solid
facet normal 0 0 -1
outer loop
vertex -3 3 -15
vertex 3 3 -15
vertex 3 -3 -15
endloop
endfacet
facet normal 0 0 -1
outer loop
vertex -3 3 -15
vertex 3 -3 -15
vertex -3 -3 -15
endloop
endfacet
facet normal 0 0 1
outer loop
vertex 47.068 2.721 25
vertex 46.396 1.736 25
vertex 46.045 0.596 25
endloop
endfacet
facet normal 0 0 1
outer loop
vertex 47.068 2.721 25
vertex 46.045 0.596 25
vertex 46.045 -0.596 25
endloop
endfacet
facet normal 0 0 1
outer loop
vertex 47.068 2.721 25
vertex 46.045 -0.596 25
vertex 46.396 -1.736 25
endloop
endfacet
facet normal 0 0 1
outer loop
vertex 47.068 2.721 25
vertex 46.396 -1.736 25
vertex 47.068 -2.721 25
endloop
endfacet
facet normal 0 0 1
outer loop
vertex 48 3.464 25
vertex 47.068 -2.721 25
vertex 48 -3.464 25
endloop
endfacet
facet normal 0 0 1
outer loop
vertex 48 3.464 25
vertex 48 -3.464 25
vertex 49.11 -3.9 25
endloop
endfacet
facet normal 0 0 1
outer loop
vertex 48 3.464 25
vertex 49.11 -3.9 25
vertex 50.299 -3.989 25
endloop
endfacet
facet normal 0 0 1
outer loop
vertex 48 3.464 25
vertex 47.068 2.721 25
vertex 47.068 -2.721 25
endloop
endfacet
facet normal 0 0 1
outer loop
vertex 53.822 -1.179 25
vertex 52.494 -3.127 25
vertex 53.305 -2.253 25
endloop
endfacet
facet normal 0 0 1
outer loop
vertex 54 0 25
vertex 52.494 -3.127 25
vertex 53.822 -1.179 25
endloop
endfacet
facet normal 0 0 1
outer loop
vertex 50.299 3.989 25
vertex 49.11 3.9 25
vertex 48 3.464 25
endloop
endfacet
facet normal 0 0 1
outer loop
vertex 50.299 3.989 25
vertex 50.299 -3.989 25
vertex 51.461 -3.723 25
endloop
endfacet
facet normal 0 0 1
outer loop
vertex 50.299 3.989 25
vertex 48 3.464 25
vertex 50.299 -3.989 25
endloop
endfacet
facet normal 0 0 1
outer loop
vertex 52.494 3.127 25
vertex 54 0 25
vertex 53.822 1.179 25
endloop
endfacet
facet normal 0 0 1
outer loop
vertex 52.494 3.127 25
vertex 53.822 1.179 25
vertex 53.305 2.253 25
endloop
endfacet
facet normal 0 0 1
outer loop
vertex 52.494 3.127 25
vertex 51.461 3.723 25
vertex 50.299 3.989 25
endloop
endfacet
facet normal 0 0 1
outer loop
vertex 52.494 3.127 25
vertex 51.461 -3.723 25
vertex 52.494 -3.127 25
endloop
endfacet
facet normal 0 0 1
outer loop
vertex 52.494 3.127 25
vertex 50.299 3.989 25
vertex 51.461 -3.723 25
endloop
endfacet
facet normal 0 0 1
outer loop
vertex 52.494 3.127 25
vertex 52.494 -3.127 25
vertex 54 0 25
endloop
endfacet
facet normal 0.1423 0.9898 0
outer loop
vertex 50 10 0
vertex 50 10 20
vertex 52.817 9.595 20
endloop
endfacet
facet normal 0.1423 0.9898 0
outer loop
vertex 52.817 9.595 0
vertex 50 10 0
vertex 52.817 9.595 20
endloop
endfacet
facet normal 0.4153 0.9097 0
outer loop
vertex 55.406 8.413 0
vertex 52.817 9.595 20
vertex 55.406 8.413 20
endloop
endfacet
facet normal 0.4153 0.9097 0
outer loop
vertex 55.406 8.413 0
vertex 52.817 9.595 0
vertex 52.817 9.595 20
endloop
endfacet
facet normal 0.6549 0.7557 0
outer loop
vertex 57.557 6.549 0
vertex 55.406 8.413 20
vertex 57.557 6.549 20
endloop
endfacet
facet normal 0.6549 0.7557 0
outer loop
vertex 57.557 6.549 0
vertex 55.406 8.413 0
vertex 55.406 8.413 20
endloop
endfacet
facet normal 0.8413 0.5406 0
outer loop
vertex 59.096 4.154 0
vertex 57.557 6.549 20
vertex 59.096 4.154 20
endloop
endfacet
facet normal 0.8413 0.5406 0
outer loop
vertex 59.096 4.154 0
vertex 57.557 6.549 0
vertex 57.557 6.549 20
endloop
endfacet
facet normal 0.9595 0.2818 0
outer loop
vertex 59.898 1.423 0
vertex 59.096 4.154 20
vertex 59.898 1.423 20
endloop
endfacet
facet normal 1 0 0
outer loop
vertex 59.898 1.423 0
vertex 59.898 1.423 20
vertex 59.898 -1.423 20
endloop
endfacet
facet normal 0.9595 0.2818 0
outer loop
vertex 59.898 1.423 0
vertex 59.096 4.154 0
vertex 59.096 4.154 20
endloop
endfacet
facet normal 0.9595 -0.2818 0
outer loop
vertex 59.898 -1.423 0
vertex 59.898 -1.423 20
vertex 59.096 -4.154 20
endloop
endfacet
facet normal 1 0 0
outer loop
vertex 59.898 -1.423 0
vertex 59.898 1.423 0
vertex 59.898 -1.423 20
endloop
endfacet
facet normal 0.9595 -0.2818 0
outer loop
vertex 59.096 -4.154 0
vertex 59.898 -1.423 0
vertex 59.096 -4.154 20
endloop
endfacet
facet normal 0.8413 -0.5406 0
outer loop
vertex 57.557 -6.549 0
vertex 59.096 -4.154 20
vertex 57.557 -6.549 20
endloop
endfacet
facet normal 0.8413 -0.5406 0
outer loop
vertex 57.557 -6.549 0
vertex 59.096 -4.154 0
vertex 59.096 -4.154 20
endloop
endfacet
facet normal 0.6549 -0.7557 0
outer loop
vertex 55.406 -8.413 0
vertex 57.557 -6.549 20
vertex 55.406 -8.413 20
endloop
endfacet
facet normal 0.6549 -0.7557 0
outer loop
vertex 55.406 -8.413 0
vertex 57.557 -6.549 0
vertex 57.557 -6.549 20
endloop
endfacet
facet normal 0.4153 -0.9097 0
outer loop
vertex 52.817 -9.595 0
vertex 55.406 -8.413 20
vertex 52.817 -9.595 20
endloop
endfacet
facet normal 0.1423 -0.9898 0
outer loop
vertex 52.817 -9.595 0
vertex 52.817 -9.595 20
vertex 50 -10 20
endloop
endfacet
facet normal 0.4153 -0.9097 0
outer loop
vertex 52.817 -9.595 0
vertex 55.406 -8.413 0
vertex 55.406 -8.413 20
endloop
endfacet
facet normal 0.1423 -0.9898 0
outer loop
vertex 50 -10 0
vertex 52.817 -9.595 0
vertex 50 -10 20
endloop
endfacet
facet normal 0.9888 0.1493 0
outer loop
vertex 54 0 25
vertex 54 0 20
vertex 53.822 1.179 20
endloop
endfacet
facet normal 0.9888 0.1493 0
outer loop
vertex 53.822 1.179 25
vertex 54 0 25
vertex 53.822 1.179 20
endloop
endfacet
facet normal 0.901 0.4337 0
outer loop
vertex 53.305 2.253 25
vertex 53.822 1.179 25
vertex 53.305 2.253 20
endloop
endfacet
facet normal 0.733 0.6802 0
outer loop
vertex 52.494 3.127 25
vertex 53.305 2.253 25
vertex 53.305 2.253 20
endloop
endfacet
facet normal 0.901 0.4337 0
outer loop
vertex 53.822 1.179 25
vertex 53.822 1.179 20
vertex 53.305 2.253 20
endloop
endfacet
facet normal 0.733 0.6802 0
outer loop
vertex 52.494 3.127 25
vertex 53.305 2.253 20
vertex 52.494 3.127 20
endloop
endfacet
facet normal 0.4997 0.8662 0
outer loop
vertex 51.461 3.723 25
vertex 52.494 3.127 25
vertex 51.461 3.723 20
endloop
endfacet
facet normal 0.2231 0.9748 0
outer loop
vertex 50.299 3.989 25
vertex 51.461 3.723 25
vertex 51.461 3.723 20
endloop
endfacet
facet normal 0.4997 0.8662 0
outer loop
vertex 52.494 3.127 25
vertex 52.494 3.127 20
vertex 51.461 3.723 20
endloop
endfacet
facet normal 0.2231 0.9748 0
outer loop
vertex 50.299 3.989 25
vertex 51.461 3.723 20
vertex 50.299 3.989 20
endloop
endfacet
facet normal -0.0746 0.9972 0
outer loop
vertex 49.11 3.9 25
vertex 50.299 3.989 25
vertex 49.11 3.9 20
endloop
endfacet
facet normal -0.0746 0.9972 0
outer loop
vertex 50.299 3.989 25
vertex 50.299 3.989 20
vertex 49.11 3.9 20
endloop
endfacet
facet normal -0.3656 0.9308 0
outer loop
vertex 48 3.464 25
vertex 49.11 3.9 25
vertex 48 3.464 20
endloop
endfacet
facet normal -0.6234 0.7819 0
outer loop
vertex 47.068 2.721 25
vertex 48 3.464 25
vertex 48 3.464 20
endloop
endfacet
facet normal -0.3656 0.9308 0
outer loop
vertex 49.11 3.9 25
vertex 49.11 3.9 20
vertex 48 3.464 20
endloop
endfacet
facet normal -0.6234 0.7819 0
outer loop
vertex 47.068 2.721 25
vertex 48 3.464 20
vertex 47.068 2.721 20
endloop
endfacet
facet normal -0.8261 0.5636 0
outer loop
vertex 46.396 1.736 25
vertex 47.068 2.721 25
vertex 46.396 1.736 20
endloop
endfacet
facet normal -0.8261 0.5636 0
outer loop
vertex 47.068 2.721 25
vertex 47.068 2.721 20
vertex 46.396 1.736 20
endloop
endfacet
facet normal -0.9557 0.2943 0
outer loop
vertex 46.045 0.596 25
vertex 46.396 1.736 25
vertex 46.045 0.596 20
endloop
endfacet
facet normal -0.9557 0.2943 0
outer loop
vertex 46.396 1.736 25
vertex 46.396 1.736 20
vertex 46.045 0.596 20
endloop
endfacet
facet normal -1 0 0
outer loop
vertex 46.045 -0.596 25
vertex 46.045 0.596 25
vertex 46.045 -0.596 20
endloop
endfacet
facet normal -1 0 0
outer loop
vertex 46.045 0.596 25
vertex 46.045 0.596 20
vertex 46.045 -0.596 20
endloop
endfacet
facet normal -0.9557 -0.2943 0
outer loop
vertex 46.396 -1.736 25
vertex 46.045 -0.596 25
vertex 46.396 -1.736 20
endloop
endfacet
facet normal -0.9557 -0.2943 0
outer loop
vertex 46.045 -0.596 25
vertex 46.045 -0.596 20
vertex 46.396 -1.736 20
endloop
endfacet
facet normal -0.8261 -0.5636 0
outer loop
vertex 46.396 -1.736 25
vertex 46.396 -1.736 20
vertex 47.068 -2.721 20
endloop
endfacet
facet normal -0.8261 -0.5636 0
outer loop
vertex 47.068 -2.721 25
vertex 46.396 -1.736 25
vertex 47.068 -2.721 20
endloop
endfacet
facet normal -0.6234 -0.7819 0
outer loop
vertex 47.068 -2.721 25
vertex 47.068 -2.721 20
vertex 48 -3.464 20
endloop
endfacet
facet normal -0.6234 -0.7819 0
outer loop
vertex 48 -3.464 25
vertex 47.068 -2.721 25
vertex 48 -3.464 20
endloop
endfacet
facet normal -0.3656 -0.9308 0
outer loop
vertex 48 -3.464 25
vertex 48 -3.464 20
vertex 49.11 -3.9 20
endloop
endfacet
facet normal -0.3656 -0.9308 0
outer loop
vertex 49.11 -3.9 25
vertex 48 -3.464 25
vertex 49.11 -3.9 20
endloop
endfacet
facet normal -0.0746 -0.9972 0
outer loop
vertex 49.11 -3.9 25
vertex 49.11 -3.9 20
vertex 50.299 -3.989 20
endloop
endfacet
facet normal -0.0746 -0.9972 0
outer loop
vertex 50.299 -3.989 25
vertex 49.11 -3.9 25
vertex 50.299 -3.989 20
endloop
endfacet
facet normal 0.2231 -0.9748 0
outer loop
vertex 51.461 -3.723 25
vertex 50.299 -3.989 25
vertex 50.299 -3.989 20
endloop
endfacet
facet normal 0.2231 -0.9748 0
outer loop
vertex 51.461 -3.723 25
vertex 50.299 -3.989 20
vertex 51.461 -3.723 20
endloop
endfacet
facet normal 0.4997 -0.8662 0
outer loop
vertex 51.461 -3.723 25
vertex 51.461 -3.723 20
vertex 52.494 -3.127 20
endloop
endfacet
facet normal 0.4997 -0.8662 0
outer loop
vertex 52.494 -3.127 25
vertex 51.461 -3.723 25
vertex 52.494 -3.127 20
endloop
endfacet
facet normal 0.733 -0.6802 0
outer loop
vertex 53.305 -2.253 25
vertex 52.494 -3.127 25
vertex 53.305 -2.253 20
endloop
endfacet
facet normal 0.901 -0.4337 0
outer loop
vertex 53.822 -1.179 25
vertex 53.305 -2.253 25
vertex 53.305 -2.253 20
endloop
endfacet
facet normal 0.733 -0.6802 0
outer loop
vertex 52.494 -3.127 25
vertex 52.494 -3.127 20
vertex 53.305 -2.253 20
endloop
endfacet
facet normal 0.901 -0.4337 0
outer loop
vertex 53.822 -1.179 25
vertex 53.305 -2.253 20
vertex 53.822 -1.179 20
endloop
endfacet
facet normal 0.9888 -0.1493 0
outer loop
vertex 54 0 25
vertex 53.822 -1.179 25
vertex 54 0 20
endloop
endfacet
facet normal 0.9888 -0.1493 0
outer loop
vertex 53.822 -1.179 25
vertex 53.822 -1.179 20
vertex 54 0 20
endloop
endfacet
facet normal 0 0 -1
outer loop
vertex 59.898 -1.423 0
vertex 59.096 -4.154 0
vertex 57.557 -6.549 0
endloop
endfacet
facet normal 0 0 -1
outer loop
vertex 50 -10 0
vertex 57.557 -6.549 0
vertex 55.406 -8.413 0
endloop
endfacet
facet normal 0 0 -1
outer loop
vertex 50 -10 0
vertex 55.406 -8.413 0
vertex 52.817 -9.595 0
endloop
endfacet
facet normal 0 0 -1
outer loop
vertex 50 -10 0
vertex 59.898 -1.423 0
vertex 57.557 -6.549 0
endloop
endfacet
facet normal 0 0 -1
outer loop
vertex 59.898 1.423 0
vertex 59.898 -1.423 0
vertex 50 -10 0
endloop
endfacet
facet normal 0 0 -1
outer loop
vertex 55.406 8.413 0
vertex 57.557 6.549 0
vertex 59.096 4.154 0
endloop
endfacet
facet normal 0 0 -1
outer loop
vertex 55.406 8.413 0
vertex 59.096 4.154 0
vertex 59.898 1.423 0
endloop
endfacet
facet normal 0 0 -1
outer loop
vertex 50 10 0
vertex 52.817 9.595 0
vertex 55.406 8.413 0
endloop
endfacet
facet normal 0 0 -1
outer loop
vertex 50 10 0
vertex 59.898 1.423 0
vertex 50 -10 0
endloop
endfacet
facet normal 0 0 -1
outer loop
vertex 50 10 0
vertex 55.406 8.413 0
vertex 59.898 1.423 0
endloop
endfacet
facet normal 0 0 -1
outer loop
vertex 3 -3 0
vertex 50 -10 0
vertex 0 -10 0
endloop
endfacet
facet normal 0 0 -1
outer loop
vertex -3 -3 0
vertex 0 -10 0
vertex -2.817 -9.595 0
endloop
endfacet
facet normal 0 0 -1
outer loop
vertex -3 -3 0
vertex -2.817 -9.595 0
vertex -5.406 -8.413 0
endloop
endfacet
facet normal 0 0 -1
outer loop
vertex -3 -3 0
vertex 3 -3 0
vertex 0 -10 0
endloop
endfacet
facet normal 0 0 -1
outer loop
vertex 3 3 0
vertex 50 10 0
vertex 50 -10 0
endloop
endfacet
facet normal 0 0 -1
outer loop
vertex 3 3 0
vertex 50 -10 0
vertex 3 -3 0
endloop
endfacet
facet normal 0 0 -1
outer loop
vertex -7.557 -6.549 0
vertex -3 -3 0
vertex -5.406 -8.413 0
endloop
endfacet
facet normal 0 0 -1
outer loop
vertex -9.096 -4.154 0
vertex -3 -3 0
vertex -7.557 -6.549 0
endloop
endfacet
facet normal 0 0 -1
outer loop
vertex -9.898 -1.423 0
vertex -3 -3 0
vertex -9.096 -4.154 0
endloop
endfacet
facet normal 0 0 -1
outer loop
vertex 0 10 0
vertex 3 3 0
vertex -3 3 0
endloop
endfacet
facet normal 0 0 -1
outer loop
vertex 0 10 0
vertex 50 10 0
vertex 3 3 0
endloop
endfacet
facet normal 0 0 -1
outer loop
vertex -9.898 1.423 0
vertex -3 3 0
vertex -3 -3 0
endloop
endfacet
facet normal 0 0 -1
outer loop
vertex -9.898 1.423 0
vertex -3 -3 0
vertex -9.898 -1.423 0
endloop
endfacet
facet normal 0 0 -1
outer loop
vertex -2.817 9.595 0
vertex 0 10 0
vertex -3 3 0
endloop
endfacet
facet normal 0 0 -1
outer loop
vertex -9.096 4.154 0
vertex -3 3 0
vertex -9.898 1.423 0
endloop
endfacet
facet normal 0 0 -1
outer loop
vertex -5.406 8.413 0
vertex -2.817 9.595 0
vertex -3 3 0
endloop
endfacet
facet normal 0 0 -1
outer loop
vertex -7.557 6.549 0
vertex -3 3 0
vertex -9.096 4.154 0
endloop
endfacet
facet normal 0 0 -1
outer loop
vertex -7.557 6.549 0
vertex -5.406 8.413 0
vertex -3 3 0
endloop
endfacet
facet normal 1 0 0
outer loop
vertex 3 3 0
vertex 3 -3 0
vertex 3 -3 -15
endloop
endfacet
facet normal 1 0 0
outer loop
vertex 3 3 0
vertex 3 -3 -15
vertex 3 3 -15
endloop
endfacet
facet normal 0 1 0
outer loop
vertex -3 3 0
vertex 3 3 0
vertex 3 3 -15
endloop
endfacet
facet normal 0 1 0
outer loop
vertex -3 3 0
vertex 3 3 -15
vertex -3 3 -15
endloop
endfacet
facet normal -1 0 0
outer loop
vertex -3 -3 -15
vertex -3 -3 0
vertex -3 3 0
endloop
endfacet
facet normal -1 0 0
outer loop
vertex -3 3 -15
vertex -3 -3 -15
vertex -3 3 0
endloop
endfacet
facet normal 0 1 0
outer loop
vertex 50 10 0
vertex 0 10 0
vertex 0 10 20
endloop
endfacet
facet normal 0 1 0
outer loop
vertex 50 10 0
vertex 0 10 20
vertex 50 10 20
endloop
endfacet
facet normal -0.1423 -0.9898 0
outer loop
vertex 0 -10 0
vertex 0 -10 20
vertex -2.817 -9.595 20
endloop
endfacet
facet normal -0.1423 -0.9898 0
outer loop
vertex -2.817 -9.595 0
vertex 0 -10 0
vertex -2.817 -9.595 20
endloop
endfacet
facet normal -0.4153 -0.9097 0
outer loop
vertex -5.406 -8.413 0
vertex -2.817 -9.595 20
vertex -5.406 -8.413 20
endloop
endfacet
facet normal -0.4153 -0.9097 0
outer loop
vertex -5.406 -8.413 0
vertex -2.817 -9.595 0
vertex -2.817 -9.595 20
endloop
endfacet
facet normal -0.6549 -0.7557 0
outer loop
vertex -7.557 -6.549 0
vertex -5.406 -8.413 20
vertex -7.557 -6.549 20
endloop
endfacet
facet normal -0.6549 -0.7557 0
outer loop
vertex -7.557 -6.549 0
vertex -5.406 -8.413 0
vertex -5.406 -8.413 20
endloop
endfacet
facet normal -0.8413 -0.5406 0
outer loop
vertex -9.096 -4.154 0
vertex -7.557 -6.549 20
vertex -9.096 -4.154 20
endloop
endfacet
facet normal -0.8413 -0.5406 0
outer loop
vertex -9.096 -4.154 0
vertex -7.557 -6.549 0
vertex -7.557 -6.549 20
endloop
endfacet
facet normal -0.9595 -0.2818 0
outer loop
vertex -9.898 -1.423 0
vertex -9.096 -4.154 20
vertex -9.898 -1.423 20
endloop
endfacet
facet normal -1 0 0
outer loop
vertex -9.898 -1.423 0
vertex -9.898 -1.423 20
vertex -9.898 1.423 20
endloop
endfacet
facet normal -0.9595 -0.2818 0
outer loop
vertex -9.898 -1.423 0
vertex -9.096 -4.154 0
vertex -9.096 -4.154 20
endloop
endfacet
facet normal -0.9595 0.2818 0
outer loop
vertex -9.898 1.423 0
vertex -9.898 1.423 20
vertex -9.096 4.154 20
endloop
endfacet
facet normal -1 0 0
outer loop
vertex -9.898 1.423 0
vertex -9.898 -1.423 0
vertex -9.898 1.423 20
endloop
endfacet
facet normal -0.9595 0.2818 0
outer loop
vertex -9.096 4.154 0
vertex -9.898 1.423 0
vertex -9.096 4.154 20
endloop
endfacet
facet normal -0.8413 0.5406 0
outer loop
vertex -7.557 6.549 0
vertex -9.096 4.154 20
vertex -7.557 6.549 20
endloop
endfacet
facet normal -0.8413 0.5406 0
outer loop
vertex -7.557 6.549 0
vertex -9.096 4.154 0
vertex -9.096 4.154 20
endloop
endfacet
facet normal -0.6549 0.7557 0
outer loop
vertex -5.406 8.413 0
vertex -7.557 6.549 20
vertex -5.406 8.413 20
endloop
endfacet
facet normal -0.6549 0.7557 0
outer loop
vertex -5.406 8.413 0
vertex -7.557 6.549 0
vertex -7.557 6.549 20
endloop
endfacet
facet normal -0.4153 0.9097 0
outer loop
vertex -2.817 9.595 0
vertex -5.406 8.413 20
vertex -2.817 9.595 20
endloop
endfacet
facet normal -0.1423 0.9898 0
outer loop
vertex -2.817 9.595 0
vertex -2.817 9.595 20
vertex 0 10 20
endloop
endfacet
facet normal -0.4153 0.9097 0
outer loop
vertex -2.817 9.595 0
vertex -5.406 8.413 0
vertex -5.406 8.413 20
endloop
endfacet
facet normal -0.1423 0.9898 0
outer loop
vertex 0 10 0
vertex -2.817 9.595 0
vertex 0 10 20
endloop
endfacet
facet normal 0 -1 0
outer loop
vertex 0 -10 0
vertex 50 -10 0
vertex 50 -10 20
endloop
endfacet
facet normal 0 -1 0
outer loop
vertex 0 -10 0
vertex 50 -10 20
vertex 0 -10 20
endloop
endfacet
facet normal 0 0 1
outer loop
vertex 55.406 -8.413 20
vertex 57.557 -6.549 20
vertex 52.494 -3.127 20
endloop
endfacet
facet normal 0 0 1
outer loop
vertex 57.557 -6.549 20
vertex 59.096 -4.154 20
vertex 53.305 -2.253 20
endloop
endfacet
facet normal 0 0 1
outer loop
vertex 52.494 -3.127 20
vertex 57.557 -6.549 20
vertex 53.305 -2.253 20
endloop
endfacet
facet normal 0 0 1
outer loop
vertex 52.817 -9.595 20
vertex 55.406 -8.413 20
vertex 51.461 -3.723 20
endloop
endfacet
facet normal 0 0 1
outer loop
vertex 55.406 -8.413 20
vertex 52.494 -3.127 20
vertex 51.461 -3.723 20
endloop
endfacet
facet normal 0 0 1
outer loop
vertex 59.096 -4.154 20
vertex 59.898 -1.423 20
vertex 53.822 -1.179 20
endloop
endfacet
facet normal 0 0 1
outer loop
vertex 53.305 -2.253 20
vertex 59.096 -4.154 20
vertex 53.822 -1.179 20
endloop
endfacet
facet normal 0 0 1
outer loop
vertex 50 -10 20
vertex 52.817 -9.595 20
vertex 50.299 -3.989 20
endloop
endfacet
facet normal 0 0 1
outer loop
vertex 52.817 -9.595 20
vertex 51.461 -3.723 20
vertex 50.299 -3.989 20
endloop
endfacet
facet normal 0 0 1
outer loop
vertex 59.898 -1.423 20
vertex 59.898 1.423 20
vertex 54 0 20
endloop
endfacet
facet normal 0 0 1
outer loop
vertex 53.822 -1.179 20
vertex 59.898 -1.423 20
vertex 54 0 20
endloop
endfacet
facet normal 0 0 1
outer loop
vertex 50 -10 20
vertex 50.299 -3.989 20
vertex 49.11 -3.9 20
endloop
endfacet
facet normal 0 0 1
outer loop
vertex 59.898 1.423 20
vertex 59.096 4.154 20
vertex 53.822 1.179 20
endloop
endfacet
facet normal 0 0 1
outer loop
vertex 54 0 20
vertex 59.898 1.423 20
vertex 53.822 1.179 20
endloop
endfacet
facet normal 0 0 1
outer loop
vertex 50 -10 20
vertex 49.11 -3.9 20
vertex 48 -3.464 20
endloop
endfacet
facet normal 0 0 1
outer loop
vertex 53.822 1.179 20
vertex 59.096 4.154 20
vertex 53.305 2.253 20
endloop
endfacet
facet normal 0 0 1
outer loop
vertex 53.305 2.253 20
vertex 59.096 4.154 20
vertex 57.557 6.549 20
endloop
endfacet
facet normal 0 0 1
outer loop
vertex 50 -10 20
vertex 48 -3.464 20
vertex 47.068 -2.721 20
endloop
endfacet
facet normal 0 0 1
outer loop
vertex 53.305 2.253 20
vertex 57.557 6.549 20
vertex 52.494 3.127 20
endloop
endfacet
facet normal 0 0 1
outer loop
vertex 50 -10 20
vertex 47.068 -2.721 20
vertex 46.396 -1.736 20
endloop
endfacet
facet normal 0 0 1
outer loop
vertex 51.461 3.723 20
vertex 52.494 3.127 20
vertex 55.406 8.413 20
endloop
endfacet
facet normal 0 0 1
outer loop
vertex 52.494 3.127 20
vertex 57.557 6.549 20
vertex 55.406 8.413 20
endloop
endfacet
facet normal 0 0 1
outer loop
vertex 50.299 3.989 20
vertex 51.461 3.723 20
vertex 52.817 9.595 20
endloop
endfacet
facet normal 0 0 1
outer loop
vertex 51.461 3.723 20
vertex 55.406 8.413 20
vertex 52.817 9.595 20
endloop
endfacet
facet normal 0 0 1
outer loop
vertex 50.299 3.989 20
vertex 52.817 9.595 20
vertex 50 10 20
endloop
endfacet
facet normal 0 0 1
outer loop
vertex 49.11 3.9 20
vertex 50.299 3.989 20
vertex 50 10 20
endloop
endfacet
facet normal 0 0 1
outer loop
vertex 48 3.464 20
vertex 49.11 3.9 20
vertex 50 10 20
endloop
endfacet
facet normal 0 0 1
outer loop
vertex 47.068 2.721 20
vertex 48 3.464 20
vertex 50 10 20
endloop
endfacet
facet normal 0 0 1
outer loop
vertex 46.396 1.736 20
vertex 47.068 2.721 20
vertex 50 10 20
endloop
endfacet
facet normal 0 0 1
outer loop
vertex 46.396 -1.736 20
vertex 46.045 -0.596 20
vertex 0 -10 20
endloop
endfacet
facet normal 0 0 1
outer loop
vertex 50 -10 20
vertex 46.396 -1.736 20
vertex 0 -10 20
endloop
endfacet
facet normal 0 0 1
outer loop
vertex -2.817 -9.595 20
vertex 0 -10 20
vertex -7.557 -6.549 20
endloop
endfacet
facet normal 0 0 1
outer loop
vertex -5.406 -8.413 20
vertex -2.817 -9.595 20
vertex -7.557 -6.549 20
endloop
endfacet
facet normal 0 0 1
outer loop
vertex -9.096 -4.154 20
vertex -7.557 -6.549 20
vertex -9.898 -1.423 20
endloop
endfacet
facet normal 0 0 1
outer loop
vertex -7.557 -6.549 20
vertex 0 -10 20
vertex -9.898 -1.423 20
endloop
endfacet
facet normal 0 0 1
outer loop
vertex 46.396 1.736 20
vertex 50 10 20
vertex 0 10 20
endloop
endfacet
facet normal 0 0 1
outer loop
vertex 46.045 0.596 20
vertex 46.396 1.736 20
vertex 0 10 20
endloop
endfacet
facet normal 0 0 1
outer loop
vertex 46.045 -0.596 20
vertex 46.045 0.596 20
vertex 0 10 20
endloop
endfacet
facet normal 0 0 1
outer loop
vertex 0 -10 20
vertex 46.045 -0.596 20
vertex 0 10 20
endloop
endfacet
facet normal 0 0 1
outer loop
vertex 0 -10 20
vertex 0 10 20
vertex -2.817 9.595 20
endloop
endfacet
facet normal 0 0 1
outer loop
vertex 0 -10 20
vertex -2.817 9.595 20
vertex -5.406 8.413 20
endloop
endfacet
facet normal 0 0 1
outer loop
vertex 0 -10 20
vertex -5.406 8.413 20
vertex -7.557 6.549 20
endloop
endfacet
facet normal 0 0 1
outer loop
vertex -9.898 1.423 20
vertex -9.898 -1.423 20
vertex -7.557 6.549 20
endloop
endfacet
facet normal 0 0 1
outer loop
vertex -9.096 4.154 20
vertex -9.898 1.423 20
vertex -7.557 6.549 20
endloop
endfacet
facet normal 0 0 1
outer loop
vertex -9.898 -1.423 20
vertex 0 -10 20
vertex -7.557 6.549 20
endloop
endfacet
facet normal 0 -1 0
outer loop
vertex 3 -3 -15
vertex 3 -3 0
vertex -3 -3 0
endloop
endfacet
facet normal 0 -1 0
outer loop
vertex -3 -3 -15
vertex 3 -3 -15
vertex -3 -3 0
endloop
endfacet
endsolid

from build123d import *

# Parameters (mm, degrees)
EXTRUDE_1_DEPTH = 20
SKETCH_2_R      = 4
EXTRUDE_2_DEPTH = 5
SKETCH_3_W      = 6
SKETCH_3_H      = 6
EXTRUDE_3_DEPTH = 15


with BuildPart() as part:
    # 草图1 → 凸台-拉伸1 (new body)
    with BuildSketch(Plane.XY):
        with BuildLine():
            Line((0, 10), (50, 10))
            ThreePointArc((50, 10), (60, 0), (50, -10))
            Line((50, -10), (0, -10))
            ThreePointArc((0, -10), (-10, 0), (0, 10))
        make_face()
    extrude(amount=EXTRUDE_1_DEPTH)

    # 草图2 → 凸台-拉伸2 (add)
    with BuildSketch(Plane.XY.offset(20)):
        with Locations((50, 0)):
            Circle(SKETCH_2_R)
    extrude(amount=EXTRUDE_2_DEPTH)

    # 草图3 → 凸台-拉伸3 (add)
    with BuildSketch(Plane(origin=(0, 0, 0), x_dir=(-1, 0, 0), z_dir=(0, 0, -1))):
        Rectangle(SKETCH_3_W, SKETCH_3_H)
    extrude(amount=EXTRUDE_3_DEPTH)


solid = part.part
